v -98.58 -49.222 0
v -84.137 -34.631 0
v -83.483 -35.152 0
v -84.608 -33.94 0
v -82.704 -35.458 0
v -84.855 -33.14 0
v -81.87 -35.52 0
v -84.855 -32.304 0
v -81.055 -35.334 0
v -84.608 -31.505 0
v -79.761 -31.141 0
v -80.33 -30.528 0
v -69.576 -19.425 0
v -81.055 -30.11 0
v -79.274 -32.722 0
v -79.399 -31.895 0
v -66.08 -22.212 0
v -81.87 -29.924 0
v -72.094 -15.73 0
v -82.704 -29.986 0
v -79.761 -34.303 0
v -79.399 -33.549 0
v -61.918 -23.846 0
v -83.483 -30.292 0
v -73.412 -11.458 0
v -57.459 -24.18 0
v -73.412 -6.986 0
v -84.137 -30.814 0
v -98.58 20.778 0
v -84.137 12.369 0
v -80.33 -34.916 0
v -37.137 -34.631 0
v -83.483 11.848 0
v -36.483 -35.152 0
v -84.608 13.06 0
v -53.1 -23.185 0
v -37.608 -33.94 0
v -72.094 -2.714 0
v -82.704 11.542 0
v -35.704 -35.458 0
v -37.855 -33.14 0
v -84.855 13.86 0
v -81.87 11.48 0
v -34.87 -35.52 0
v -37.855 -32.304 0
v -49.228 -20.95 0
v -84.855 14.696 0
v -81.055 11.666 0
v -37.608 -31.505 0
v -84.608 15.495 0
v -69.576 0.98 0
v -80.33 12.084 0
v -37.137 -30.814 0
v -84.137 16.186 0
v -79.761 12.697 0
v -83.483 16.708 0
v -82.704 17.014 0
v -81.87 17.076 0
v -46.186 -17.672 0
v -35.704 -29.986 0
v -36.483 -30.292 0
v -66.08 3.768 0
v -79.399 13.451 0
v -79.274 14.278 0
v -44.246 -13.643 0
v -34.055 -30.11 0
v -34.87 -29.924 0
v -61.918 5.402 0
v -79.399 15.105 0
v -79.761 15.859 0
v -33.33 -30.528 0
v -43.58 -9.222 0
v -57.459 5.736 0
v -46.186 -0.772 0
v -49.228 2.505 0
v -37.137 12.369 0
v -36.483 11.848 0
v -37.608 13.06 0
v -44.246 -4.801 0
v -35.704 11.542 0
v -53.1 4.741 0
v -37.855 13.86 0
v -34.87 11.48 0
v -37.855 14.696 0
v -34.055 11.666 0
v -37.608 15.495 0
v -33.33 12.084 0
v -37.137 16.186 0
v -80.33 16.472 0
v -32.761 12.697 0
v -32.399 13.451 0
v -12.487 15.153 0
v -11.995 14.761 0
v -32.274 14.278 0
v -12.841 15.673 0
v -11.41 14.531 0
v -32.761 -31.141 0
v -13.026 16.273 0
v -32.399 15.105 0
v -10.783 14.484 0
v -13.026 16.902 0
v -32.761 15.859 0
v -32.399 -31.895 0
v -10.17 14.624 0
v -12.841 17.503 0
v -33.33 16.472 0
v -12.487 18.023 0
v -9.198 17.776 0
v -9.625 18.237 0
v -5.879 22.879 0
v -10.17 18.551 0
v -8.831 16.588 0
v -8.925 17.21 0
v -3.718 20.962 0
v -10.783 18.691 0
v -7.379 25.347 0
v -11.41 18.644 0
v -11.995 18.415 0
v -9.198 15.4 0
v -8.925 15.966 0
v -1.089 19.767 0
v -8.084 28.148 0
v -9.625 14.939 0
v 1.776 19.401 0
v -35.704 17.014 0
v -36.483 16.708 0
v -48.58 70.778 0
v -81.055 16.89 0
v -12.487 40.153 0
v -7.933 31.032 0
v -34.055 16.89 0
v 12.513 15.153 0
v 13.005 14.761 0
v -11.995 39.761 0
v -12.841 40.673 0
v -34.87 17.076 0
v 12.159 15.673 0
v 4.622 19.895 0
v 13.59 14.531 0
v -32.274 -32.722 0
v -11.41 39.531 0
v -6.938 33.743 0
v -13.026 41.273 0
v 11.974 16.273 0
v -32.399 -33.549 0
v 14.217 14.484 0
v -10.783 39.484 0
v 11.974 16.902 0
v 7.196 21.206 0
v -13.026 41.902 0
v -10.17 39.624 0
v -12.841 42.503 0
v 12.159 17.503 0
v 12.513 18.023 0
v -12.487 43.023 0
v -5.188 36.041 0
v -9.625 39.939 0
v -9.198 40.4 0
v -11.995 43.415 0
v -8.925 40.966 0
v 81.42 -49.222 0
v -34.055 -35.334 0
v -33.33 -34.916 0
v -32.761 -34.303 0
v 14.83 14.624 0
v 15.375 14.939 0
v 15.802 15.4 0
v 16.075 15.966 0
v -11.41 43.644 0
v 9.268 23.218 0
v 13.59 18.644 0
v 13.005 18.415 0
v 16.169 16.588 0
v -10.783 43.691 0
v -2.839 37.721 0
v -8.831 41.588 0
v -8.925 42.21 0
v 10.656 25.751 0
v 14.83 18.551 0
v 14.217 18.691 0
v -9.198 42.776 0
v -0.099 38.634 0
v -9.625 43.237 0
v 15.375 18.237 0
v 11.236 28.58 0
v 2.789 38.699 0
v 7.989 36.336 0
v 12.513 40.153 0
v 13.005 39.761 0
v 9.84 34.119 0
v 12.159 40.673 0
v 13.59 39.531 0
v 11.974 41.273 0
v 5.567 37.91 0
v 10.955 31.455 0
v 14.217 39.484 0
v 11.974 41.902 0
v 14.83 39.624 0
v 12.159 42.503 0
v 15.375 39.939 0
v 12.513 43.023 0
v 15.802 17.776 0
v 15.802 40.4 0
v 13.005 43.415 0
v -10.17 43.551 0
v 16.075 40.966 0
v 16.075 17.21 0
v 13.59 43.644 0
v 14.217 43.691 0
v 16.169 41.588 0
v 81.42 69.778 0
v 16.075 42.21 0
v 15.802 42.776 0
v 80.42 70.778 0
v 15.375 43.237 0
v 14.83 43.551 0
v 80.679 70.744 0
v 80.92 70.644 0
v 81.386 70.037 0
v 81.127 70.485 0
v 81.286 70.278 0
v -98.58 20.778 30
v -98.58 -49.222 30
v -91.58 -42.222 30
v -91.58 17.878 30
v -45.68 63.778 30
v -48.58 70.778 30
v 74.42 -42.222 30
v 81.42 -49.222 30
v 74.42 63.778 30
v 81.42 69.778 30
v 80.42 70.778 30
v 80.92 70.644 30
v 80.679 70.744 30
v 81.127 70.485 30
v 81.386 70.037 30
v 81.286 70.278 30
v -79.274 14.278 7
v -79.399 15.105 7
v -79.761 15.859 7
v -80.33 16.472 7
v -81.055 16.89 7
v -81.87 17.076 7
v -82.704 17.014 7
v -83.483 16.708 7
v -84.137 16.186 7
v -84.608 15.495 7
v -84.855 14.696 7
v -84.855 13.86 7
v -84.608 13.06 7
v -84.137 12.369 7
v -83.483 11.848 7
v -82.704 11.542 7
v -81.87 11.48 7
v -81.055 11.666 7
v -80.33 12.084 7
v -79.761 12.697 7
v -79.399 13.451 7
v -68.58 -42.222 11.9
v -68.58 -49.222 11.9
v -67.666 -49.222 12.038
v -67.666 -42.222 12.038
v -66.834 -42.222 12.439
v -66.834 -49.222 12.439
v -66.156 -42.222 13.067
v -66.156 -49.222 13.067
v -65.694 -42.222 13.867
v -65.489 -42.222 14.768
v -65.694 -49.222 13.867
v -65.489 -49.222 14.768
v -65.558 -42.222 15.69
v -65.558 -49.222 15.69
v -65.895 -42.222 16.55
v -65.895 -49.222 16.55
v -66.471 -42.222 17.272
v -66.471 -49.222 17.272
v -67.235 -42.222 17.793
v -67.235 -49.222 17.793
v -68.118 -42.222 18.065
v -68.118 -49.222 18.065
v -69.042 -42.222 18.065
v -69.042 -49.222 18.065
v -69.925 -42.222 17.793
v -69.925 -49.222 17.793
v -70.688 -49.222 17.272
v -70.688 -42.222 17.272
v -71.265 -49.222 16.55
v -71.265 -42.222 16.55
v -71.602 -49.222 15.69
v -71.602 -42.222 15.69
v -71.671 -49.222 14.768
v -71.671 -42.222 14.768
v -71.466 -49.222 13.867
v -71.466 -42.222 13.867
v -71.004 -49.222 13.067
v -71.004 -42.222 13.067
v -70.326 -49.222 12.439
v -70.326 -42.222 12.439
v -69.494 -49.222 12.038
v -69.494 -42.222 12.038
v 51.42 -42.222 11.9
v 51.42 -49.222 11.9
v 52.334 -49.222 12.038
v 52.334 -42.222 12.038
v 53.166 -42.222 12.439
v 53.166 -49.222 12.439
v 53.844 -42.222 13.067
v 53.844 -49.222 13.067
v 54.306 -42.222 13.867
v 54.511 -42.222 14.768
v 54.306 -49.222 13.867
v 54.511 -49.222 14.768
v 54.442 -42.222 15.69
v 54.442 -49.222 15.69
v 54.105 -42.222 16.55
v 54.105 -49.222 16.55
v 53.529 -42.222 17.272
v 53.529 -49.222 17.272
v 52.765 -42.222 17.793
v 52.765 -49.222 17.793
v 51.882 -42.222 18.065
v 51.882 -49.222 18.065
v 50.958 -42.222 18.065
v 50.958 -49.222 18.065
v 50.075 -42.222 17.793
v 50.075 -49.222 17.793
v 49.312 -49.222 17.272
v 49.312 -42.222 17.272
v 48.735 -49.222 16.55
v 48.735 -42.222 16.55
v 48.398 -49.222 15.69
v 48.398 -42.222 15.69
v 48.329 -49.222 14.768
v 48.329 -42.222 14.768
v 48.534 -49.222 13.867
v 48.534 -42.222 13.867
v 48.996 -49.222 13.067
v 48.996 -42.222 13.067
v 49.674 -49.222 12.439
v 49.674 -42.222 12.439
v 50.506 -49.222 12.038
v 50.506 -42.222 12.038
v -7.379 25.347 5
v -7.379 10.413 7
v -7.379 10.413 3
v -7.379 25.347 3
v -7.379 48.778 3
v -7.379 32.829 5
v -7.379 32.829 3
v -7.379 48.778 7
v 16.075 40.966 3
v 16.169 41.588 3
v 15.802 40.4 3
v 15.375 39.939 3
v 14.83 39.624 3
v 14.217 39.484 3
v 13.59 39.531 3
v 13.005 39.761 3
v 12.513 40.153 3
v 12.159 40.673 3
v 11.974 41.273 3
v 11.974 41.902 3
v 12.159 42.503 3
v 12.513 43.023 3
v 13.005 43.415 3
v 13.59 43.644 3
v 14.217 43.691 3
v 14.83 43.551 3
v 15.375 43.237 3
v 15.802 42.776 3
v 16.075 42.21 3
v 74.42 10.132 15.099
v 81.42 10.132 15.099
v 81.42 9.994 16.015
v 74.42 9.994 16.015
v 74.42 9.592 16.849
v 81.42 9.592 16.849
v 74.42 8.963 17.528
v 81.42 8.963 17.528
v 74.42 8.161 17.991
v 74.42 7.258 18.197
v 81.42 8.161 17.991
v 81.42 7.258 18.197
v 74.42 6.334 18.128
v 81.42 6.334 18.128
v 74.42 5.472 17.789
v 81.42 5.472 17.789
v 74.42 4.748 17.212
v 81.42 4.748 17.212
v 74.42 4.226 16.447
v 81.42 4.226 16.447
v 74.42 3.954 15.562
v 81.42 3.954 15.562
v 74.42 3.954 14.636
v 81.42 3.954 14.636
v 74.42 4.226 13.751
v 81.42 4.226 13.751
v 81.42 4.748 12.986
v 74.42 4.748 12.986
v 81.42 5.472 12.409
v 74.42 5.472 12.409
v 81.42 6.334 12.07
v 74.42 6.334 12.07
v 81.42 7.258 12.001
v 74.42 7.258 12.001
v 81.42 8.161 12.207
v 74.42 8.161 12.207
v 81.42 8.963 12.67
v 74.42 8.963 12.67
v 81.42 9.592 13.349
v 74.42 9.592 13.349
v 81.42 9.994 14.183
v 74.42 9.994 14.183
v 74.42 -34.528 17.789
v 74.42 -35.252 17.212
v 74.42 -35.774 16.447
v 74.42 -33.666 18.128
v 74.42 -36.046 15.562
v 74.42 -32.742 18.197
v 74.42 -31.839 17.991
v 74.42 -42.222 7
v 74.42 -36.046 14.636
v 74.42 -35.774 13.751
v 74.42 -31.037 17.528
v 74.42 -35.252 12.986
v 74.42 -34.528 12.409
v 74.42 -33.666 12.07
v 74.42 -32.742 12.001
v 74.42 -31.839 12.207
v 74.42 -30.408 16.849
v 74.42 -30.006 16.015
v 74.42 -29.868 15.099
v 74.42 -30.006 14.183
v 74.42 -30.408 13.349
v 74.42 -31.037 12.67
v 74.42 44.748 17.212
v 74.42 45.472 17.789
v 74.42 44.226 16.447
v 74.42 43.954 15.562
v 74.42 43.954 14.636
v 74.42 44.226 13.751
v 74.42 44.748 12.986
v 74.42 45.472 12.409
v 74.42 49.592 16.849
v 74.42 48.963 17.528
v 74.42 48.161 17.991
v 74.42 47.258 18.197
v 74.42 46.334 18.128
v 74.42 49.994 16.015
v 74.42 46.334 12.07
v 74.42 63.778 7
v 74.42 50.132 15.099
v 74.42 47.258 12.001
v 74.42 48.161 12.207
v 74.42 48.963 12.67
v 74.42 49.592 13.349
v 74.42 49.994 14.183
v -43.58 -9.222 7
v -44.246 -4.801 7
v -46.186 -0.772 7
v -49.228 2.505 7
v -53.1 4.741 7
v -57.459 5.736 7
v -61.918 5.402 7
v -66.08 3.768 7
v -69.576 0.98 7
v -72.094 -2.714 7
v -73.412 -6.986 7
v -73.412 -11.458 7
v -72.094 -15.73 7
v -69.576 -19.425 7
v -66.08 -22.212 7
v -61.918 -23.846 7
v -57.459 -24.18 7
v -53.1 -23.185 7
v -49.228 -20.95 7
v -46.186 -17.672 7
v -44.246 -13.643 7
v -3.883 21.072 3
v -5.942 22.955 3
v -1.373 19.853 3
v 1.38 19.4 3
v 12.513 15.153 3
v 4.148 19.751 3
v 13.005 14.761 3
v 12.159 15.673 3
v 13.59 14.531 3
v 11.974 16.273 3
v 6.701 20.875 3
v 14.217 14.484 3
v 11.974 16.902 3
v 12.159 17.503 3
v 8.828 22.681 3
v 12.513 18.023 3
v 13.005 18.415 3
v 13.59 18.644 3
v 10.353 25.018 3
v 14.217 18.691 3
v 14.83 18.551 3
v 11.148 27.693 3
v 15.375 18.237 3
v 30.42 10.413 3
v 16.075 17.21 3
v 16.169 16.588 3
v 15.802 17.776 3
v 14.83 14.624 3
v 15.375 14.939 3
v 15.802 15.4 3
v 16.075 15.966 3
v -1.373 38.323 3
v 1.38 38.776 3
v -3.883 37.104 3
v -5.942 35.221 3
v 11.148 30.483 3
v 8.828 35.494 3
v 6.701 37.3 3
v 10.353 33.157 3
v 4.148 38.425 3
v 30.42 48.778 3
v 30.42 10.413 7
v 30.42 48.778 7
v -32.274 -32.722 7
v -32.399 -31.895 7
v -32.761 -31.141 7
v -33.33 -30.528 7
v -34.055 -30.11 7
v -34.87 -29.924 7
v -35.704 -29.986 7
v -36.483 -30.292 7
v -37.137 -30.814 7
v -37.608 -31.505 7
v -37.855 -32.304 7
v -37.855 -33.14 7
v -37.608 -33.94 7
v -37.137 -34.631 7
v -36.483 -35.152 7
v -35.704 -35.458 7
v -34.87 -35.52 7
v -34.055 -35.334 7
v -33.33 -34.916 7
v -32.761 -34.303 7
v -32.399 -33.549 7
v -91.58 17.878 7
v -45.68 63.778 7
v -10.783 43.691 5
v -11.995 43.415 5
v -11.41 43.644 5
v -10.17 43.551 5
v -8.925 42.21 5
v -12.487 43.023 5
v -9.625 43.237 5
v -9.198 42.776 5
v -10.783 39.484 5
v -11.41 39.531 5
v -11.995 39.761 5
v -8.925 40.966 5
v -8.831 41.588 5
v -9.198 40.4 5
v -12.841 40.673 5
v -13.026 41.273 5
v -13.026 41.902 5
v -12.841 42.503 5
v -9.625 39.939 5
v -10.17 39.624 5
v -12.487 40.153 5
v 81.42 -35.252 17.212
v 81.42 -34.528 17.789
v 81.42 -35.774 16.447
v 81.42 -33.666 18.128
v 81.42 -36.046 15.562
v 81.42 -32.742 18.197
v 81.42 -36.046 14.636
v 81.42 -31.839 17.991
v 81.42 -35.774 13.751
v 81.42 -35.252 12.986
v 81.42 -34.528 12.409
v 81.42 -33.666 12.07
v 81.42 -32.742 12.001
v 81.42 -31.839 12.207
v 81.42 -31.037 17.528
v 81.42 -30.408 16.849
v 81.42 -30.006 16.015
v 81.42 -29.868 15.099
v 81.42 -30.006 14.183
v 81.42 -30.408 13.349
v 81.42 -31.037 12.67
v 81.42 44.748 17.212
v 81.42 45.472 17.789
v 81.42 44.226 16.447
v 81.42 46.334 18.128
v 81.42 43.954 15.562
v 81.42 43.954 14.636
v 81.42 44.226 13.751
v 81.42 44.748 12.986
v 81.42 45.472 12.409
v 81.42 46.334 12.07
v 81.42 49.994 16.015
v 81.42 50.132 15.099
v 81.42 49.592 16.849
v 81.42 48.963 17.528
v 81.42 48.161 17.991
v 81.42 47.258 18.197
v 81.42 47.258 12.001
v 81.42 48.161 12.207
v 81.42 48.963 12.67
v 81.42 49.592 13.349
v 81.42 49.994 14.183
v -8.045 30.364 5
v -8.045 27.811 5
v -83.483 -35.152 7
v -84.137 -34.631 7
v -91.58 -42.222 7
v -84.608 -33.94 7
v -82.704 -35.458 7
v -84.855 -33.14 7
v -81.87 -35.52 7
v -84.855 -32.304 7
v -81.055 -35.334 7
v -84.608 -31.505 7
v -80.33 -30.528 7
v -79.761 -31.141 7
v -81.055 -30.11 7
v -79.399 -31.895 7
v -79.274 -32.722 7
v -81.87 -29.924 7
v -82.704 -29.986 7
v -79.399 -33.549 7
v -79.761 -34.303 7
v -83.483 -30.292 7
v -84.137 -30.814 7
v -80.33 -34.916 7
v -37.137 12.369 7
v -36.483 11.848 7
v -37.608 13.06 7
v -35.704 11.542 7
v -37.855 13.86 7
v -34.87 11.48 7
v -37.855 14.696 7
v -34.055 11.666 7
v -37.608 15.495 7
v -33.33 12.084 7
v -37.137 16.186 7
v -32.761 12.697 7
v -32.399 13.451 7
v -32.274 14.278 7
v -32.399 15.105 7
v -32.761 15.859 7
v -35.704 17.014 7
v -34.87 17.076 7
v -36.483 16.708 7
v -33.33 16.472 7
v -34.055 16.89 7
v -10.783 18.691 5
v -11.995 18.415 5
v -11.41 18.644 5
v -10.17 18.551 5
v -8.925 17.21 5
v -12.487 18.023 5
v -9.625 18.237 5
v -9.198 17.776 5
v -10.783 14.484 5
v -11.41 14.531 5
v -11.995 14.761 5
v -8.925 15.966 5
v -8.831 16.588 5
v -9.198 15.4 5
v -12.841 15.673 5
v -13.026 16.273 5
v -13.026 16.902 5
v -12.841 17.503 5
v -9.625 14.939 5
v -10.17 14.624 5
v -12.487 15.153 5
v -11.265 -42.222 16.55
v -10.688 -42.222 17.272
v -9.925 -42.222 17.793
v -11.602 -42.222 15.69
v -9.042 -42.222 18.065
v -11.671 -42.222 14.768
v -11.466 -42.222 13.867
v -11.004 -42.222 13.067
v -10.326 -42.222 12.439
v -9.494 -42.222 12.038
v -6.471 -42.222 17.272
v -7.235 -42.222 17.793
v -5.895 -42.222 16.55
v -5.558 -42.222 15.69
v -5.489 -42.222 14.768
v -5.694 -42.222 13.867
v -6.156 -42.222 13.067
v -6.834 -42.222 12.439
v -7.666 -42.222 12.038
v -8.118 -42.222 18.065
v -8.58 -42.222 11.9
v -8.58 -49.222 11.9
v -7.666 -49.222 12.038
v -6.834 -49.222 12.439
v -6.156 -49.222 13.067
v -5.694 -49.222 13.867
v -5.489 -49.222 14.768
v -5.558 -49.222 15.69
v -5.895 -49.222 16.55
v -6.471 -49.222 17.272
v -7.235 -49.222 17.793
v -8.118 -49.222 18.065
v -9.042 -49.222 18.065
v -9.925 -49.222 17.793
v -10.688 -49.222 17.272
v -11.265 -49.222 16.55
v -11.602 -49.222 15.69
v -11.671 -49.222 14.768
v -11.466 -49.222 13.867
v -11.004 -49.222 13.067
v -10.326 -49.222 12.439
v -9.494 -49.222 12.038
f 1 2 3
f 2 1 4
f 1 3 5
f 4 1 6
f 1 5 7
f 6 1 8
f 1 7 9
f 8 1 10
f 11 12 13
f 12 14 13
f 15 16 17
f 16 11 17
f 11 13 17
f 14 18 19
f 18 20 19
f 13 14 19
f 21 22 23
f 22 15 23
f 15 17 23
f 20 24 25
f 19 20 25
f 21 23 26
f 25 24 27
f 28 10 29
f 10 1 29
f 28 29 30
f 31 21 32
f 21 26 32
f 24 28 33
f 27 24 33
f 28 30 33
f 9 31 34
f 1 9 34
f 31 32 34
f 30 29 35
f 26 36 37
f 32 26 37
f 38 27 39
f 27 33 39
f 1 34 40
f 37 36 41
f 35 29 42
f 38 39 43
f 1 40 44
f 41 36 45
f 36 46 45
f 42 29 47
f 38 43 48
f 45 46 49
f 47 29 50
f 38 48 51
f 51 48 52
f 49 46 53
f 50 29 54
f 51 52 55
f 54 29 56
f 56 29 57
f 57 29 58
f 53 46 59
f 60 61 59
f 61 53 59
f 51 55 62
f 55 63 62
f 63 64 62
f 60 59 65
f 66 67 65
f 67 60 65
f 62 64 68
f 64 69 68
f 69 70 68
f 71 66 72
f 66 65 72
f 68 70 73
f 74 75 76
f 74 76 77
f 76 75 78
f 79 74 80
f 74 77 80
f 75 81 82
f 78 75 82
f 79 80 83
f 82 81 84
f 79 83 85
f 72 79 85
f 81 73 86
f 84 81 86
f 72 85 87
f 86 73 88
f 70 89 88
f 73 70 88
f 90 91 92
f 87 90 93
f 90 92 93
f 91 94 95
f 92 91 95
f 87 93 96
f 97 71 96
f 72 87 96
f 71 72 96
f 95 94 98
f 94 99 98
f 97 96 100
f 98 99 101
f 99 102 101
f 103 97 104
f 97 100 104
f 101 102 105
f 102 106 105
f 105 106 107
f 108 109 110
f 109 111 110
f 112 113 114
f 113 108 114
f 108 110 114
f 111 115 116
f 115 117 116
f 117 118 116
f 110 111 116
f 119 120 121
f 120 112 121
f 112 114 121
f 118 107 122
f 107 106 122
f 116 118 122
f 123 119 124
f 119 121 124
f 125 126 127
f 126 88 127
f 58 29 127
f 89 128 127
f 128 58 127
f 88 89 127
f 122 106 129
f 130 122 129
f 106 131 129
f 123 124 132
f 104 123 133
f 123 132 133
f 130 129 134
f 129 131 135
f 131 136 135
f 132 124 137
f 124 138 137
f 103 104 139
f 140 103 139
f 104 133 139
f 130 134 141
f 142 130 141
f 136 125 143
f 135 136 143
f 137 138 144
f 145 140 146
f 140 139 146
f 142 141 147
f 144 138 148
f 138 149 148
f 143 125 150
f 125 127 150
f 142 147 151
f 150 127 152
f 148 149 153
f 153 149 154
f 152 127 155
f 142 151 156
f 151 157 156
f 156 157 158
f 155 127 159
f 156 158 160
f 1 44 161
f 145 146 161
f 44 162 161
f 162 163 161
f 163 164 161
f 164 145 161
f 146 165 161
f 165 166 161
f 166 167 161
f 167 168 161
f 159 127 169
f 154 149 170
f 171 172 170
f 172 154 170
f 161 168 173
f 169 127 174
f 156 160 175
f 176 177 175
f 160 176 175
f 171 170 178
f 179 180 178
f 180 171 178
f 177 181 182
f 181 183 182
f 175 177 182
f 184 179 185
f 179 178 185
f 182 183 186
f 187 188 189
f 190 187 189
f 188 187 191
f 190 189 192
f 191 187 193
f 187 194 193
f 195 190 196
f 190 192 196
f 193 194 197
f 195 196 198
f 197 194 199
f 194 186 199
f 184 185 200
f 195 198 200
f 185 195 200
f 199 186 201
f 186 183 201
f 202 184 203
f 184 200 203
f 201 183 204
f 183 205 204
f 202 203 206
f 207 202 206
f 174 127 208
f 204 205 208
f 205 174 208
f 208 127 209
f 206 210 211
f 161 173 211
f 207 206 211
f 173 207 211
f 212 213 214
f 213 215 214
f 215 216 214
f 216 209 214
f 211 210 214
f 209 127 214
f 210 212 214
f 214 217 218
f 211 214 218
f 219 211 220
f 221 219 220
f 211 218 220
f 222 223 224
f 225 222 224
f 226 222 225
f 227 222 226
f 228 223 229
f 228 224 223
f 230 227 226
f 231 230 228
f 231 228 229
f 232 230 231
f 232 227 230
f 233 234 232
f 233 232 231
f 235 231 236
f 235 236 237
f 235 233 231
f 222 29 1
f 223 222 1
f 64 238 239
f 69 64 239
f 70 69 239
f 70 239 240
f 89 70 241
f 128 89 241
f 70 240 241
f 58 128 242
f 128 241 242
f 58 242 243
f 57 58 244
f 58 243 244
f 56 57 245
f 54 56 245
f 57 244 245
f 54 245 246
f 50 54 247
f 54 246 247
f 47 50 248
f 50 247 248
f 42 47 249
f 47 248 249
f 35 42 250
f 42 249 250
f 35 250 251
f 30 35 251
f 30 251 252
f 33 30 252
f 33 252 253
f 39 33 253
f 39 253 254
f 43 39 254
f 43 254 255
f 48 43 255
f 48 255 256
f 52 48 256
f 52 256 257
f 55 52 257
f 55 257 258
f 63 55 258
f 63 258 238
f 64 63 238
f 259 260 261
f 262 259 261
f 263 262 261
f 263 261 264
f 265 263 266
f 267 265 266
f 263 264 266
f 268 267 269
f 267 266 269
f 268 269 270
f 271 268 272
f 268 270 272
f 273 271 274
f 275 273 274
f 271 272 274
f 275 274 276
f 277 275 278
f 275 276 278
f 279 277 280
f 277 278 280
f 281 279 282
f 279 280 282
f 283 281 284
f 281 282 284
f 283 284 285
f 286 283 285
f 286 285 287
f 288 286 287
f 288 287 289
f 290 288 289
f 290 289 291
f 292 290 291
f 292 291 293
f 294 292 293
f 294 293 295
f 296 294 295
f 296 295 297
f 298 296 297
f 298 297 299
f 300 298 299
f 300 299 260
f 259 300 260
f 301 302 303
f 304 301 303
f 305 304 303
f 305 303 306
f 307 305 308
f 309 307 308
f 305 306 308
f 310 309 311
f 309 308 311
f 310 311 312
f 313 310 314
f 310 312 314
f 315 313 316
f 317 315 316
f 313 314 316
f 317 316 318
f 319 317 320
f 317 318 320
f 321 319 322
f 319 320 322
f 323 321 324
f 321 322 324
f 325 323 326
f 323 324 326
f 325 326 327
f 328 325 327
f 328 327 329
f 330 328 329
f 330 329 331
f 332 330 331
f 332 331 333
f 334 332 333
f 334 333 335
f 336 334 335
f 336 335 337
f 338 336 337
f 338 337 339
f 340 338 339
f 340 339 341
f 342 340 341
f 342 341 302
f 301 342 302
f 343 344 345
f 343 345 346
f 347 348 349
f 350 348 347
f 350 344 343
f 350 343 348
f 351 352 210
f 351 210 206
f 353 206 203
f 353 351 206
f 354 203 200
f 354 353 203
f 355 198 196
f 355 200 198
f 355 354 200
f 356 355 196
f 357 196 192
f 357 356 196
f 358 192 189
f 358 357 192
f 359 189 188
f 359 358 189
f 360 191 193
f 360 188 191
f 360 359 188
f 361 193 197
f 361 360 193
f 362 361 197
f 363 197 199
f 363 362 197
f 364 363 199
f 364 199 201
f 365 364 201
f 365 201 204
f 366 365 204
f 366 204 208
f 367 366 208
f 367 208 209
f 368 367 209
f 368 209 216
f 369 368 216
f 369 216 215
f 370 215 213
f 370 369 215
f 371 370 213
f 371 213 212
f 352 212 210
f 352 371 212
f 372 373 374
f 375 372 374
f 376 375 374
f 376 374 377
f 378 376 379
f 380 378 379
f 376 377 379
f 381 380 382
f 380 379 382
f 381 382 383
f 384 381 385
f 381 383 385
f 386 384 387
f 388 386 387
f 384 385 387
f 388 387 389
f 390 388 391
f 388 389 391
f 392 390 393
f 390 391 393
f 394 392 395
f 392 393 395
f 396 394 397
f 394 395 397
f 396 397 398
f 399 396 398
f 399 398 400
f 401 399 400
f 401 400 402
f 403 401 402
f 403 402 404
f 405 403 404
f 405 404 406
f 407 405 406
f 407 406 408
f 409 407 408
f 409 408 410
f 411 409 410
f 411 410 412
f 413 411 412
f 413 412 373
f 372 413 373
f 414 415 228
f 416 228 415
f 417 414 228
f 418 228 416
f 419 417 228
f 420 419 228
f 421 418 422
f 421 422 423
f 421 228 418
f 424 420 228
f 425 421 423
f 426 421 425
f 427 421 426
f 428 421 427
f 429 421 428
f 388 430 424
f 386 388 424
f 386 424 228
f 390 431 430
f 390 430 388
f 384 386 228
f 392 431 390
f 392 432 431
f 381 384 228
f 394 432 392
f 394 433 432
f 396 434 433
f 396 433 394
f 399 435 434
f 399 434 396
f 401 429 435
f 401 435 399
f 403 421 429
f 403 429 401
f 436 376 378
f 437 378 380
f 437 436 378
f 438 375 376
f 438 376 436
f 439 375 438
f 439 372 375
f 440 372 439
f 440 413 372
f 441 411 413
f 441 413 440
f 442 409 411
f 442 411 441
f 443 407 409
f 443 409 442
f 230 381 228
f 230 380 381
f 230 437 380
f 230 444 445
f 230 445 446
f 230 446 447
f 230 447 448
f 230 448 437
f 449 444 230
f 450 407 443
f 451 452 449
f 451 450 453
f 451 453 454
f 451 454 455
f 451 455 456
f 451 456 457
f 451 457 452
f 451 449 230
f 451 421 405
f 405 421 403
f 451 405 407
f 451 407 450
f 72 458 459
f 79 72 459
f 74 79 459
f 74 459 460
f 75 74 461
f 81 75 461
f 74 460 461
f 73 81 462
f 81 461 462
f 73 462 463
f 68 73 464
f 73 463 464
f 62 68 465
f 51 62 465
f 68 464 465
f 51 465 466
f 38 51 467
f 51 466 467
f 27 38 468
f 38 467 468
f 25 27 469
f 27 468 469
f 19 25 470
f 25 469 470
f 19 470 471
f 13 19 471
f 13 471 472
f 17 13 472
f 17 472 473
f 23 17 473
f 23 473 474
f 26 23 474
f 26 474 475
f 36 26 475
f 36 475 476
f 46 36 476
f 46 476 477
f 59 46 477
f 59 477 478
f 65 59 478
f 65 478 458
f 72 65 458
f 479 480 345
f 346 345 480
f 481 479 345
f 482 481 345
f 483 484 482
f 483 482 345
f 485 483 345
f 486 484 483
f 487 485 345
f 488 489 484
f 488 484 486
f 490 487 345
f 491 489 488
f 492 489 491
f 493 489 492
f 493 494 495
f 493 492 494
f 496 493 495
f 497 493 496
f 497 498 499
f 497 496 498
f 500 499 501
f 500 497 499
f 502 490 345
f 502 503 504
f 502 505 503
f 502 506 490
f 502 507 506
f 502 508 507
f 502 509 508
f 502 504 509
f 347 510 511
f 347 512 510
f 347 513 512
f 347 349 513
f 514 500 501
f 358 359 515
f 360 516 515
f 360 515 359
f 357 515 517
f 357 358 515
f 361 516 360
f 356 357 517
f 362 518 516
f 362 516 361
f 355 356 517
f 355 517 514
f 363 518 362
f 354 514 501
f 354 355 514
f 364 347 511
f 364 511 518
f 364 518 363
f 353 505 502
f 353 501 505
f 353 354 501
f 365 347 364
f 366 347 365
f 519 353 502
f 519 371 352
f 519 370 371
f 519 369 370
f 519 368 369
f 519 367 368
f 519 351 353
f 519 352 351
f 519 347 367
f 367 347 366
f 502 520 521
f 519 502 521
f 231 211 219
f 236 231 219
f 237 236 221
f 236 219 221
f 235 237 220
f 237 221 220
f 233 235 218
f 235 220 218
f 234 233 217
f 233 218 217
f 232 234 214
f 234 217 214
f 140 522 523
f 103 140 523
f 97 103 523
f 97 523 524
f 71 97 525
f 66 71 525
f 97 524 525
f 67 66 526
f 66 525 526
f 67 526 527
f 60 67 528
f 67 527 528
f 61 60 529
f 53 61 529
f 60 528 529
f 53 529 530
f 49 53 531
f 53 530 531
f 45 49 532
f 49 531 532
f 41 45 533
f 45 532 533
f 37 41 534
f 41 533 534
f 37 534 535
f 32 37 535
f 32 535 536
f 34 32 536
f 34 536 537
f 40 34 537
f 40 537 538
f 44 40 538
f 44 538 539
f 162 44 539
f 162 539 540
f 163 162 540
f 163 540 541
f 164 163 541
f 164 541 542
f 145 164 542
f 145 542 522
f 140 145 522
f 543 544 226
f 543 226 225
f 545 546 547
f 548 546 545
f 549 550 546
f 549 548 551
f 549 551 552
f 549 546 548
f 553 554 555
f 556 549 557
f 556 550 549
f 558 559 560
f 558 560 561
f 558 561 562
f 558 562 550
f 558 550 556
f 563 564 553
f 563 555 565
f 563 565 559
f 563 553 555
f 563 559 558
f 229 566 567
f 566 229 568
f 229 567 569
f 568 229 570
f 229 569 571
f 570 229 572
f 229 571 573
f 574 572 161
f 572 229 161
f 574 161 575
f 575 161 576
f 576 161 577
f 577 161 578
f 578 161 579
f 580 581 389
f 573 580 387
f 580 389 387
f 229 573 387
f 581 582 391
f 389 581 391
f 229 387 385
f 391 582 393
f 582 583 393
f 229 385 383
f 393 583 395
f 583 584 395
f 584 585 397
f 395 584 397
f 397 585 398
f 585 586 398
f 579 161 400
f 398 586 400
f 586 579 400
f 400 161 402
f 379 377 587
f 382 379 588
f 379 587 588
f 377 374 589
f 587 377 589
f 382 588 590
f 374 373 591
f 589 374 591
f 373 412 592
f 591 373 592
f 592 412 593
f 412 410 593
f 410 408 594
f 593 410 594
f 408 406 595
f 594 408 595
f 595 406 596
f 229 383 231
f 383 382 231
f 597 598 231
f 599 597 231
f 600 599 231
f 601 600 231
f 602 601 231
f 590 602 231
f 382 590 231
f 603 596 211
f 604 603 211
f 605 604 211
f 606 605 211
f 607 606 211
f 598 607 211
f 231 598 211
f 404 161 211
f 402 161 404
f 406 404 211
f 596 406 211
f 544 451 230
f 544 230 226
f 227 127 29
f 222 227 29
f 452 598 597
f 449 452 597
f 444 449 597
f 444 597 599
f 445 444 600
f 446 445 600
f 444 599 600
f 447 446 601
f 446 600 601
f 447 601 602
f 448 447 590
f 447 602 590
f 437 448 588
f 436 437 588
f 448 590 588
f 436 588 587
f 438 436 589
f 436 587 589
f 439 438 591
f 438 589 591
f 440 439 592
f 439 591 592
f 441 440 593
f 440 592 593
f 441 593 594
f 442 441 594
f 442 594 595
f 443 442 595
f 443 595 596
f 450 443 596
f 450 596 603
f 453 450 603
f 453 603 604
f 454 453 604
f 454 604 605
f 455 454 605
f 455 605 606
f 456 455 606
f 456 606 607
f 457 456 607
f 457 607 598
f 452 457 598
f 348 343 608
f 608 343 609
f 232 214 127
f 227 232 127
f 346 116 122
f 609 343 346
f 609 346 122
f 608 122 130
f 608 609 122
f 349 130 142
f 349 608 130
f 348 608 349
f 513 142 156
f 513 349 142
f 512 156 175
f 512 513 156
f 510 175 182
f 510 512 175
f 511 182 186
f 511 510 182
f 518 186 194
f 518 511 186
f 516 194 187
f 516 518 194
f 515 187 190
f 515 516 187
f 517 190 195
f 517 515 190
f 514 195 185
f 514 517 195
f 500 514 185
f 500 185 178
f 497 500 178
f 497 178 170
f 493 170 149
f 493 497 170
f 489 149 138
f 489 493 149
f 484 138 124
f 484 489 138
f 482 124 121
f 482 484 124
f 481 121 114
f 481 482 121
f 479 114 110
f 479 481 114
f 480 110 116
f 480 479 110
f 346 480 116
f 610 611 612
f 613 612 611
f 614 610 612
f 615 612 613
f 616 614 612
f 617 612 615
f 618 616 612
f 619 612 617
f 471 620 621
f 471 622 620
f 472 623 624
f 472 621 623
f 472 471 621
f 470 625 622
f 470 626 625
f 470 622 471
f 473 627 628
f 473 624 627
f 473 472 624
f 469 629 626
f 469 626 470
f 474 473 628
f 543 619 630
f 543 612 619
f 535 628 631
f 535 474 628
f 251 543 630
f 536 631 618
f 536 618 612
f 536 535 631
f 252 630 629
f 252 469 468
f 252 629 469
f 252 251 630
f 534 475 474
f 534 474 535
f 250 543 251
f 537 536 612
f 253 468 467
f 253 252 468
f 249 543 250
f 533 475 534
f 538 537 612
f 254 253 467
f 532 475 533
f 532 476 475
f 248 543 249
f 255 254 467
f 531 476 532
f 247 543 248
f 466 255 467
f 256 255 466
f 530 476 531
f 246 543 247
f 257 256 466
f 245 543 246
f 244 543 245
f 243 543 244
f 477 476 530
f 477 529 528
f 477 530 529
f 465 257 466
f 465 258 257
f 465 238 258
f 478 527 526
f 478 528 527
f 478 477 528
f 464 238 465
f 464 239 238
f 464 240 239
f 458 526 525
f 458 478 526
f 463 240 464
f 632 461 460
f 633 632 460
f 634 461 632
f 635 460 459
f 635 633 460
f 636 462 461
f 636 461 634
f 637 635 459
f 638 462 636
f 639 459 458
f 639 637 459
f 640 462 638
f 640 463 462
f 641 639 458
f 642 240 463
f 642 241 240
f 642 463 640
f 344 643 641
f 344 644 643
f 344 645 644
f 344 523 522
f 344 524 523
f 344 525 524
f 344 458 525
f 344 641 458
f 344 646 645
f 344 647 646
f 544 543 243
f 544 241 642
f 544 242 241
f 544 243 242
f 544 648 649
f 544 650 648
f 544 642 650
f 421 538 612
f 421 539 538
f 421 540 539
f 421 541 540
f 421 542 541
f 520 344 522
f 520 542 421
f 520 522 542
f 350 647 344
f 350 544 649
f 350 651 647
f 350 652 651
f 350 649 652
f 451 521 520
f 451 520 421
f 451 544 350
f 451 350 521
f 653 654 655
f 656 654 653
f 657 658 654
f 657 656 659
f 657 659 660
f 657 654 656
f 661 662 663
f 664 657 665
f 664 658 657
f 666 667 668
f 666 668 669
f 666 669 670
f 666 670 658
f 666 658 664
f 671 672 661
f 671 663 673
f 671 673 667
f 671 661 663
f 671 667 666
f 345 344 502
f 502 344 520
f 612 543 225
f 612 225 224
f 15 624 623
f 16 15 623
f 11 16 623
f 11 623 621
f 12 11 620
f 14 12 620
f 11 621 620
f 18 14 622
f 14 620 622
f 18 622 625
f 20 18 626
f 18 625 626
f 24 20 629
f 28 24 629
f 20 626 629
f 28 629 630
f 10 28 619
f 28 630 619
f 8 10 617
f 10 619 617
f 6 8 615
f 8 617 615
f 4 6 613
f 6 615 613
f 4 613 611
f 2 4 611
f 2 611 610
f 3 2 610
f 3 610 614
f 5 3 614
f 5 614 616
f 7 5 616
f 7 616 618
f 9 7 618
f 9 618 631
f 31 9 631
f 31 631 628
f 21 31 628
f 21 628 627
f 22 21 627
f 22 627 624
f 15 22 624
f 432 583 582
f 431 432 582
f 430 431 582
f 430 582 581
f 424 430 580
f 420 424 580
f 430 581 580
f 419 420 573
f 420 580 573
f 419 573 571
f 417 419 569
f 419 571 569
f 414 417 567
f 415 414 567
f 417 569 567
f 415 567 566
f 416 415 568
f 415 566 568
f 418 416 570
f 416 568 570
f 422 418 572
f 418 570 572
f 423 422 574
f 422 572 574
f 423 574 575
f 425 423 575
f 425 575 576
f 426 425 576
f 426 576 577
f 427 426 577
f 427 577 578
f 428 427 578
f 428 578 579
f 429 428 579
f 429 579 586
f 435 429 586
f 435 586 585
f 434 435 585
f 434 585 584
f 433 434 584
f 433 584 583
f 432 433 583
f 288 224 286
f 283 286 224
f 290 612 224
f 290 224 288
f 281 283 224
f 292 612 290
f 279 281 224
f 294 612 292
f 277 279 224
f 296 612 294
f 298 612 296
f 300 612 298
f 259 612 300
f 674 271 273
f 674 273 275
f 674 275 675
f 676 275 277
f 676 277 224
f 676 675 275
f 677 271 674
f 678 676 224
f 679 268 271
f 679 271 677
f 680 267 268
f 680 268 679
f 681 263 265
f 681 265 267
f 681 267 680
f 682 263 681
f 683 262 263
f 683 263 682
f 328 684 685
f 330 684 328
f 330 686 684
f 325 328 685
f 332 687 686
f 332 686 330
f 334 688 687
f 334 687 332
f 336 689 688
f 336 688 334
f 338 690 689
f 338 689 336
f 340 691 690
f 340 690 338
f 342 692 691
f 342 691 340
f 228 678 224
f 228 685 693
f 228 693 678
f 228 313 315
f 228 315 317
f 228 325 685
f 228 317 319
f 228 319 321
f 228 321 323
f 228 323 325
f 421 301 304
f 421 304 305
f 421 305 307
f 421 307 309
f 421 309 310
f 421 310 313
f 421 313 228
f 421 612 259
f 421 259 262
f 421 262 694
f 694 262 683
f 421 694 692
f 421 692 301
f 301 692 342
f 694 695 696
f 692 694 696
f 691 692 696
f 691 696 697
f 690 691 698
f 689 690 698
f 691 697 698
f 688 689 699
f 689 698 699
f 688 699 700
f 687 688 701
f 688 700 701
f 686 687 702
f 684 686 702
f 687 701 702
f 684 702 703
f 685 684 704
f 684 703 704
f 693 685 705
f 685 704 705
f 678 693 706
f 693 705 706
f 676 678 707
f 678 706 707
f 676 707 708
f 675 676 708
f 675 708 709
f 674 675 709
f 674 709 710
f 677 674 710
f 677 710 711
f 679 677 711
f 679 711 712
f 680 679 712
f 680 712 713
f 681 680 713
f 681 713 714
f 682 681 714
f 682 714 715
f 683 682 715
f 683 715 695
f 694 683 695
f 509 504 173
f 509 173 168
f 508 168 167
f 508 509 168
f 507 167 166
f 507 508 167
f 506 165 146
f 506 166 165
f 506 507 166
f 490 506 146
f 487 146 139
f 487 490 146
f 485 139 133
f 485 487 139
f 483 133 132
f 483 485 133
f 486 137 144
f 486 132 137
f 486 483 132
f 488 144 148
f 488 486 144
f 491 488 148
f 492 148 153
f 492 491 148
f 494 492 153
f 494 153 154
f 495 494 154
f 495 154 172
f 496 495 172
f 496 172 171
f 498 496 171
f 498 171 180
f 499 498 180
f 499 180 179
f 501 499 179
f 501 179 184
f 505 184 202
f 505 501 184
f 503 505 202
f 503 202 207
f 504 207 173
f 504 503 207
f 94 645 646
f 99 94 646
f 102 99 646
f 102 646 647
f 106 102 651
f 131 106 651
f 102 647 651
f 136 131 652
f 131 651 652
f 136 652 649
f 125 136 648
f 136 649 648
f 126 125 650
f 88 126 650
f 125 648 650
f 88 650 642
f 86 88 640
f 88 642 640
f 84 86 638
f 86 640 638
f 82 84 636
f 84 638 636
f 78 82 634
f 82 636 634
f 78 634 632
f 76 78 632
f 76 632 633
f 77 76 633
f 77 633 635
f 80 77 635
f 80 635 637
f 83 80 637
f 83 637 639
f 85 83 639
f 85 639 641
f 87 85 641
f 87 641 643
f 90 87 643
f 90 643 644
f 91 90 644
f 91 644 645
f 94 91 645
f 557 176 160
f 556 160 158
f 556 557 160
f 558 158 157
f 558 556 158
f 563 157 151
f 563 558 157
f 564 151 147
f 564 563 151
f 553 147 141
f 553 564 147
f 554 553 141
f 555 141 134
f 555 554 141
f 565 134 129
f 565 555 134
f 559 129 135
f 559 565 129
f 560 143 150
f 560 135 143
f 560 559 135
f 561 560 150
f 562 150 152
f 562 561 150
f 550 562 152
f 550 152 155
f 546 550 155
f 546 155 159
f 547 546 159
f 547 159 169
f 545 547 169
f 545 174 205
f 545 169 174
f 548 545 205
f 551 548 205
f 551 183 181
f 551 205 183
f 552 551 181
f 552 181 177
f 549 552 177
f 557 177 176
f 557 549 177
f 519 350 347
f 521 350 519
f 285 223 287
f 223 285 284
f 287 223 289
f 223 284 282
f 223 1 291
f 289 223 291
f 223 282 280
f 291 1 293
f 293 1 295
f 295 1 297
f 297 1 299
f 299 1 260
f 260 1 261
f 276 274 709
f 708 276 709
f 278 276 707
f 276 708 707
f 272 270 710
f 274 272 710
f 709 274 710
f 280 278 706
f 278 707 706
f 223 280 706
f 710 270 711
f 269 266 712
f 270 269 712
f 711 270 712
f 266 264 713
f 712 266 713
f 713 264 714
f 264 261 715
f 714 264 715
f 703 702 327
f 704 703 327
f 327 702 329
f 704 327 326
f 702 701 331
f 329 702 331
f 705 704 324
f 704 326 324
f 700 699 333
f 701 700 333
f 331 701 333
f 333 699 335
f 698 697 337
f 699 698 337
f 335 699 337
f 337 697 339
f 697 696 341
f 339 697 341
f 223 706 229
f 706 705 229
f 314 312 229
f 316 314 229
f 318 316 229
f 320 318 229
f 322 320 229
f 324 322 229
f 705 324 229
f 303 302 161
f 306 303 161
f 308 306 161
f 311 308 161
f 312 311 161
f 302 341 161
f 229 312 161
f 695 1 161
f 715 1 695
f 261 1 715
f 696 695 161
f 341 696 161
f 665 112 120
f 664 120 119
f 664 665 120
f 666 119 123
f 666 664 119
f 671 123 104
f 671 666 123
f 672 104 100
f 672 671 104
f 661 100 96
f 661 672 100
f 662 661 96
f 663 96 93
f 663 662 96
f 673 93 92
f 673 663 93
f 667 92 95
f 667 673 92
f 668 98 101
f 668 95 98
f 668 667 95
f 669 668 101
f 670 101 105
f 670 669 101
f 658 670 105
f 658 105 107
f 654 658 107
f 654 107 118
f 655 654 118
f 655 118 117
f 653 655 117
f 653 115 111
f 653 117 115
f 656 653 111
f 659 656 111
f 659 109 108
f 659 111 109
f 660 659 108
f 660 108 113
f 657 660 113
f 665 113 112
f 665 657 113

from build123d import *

# Parameters (mm, degrees)
BOSS_EXTRUDE1_DEPTH  = 30
SHELL1_T             = -7
SKETCH2_R            = 15
CUT_EXTRUDE1_DEPTH   = 20
SKETCH3_R            = 2.805999004
CUT_EXTRUDE2_DEPTH   = 20
LPATTERN1_COUNT      = 2
LPATTERN1_PITCH      = 47
LPATTERN1_COUNT_DIR2 = 2
LPATTERN1_PITCH_DIR2 = 47
SKETCH4_W            = 37.798746628
SKETCH4_H            = 38.365375912
CUT_EXTRUDE3_DEPTH   = 4
SKETCH5_R            = 9.689386482
CUT_EXTRUDE4_DEPTH   = 10
SKETCH6_R            = 2.109382838
CUT_EXTRUDE5_DEPTH   = 10
LPATTERN2_COUNT      = 2
LPATTERN2_PITCH      = 25
LPATTERN2_COUNT_DIR2 = 2
LPATTERN2_PITCH_DIR2 = 25
SKETCH7_R            = 3.099977118
CUT_EXTRUDE6_DEPTH   = 10
LPATTERN3_COUNT      = 3
LPATTERN3_PITCH      = 60
SKETCH8_R            = 3.106688242
CUT_EXTRUDE7_DEPTH   = 10
LPATTERN4_COUNT      = 3
LPATTERN4_PITCH      = 40


with BuildPart() as part:
    # Sketch1 → Boss-Extrude1 (new body)
    with BuildSketch(Plane.XY):
        with BuildLine():
            Line((-48.579903717, 70.777906396), (-98.579903717, 20.777906396))
            Line((-98.579903717, 20.777906396), (-98.579903717, -49.222093604))
            Line((-98.579903717, -49.222093604), (81.420096283, -49.222093604))
            Line((81.420096283, -49.222093604), (81.420096283, 69.777906396))
            ThreePointArc((81.420096283, 69.777906396), (81.127203064, 70.485013177), (80.420096283, 70.777906396))
            Line((80.420096283, 70.777906396), (-48.579903717, 70.777906396))
        make_face()
    extrude(amount=BOSS_EXTRUDE1_DEPTH)

    # Shell1
    shell1_openings = [part.faces().sort_by_distance(p)[0] for p in [
        (-4.076298463, 8.11549528, 30),
    ]]
    offset(amount=SHELL1_T, openings=shell1_openings, kind=Kind.INTERSECTION)

    # Sketch2 → Cut-Extrude1 (cut)
    with BuildSketch(Plane.XY.offset(7)):
        with Locations((-58.579903717, -9.222093604)):
            Circle(SKETCH2_R)
    extrude(amount=-CUT_EXTRUDE1_DEPTH, mode=Mode.SUBTRACT)

    # Sketch3 → Cut-Extrude2 (cut)
    with BuildSketch(Plane.XY.offset(7)):
        with Locations((-82.079903717, 14.277906396)):
            Circle(SKETCH3_R)
    cut_extrude2 = extrude(amount=-CUT_EXTRUDE2_DEPTH, mode=Mode.SUBTRACT)

    # LPattern1: Cut-Extrude2 2 × 2
    with Locations(*[(i * LPATTERN1_PITCH, -j * LPATTERN1_PITCH_DIR2, 0) for i in range(LPATTERN1_COUNT) for j in range(LPATTERN1_COUNT_DIR2) if (i, j) != (0, 0)]):
        add(cut_extrude2, mode=Mode.SUBTRACT)

    # Sketch4 → Cut-Extrude3 (cut)
    with BuildSketch(Plane.XY.offset(7)):
        with Locations((11.520722969, 29.59521844)):
            Rectangle(SKETCH4_W, SKETCH4_H)
    extrude(amount=-CUT_EXTRUDE3_DEPTH, mode=Mode.SUBTRACT)

    # Sketch5 → Cut-Extrude4 (cut)
    with BuildSketch(Plane(origin=(0, 0, 5), x_dir=(-1, 0, 0), z_dir=(0, 0, -1))):
        with Locations(Location((-1.55943854, 29.087809619, 0), (0, 0, 337.288675779))):
            Circle(SKETCH5_R)
    extrude(amount=CUT_EXTRUDE4_DEPTH, mode=Mode.SUBTRACT)

    # Sketch6 → Cut-Extrude5 (cut)
    with BuildSketch(Plane(origin=(0, 0, 5), x_dir=(-1, 0, 0), z_dir=(0, 0, -1))):
        with Locations(Location((-14.05943854, 41.587809619, 0), (0, 0, 180))):
            Circle(SKETCH6_R)
    cut_extrude5 = extrude(amount=CUT_EXTRUDE5_DEPTH, mode=Mode.SUBTRACT)

    # LPattern2: Cut-Extrude5 2 × 2
    with Locations(*[(-i * LPATTERN2_PITCH, -j * LPATTERN2_PITCH_DIR2, 0) for i in range(LPATTERN2_COUNT) for j in range(LPATTERN2_COUNT_DIR2) if (i, j) != (0, 0)]):
        add(cut_extrude5, mode=Mode.SUBTRACT)

    # Sketch7 → Cut-Extrude6 (cut)
    with BuildSketch(Plane.XZ.offset(49.222093604)):
        with Locations(Location((-68.579903717, 15, 0), (0, 0, 270))):
            Circle(SKETCH7_R)
    cut_extrude6 = extrude(amount=-CUT_EXTRUDE6_DEPTH, mode=Mode.SUBTRACT)

    # LPattern3: Cut-Extrude6 ×3
    with Locations(*[(i * LPATTERN3_PITCH, 0, 0) for i in range(1, LPATTERN3_COUNT)]):
        add(cut_extrude6, mode=Mode.SUBTRACT)

    # Sketch8 → Cut-Extrude7 (cut)
    with BuildSketch(Plane(origin=(81.420096283, 0, 0), x_dir=(0, 0, -1), z_dir=(1, 0, 0))):
        with Locations(Location((-15.098987318, -32.974488262, 0), (0, 0, 90))):
            Circle(SKETCH8_R)
    cut_extrude7 = extrude(amount=-CUT_EXTRUDE7_DEPTH, mode=Mode.SUBTRACT)

    # LPattern4: Cut-Extrude7 ×3
    with Locations(*[(0, i * LPATTERN4_PITCH, 0) for i in range(1, LPATTERN4_COUNT)]):
        add(cut_extrude7, mode=Mode.SUBTRACT)


solid = part.part
